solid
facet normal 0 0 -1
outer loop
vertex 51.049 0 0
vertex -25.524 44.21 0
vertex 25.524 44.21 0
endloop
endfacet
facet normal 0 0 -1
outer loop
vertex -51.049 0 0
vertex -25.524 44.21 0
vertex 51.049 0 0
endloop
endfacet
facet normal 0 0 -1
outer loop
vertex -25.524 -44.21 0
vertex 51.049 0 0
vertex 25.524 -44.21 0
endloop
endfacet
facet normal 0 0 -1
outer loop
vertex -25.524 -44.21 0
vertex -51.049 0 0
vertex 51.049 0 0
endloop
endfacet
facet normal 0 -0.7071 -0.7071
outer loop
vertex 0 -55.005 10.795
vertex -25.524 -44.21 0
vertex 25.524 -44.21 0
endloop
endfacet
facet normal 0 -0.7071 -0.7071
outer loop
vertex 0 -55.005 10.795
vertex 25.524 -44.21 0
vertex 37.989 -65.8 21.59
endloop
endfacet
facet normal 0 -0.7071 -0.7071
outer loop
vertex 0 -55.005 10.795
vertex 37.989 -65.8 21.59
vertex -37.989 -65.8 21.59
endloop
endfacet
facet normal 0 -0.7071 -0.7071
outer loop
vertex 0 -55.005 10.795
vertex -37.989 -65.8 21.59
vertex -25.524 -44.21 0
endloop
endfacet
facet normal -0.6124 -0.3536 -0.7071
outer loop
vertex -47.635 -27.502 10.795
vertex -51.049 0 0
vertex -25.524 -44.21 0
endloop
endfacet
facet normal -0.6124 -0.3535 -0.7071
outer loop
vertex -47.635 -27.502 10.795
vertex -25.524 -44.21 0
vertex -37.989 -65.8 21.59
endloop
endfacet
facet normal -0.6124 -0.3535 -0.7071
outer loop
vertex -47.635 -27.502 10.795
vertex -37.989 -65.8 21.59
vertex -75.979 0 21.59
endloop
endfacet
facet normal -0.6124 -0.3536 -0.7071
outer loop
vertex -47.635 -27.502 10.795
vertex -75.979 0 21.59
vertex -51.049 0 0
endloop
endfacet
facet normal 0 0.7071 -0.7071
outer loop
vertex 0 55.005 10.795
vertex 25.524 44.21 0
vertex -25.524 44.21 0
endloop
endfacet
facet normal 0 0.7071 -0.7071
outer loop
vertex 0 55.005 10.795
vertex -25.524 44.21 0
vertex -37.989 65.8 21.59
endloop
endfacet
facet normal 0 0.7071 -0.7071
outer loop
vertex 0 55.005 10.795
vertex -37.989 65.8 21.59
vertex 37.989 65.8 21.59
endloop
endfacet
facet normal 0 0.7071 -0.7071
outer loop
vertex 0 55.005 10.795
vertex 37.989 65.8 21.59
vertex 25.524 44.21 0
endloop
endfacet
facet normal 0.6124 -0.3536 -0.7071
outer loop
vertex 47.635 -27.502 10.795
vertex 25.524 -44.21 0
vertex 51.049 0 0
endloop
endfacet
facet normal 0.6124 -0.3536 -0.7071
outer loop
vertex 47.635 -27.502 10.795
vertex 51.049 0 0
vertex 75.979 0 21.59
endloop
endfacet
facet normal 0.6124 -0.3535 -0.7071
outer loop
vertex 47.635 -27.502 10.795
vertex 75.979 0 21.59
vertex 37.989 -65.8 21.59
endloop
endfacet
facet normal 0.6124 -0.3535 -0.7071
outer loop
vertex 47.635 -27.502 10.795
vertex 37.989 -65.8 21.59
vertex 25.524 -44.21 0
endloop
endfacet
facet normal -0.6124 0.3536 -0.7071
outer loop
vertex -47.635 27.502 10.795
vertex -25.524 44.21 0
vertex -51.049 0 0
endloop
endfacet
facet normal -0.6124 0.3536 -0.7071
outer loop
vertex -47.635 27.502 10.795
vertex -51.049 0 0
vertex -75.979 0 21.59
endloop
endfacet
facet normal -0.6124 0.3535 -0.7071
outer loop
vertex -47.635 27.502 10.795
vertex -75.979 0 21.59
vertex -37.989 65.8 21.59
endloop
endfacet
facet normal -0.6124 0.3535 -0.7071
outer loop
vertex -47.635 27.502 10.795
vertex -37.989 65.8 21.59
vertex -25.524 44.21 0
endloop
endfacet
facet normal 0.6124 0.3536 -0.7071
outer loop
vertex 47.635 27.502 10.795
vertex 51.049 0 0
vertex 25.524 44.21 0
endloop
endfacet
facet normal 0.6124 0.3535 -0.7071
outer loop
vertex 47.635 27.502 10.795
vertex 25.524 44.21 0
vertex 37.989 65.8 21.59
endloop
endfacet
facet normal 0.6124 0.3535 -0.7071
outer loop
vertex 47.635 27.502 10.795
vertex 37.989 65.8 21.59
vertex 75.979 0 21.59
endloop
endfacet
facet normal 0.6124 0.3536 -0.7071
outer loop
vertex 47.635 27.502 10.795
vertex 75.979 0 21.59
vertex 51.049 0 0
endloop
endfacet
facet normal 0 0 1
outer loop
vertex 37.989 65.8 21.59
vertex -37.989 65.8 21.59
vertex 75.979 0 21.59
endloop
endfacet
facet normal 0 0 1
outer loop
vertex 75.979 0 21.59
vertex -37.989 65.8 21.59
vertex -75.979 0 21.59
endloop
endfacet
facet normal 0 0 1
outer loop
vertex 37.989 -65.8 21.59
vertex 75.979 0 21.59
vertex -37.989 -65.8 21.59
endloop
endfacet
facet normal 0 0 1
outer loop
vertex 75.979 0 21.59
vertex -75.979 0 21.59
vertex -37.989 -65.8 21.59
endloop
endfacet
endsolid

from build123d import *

# Parameters (mm, degrees)
F1_DEPTH = 21.59
F1_TAPER = -45


with BuildPart() as f1:
    # F0 (on Top) → F1 (new body)
    with BuildSketch(Plane.XY):
        Polygon((-25.524482131, 44.2096998878), (-51.048964262, 0), (-25.524482131, -44.2096998878), (25.524482131, -44.2096998878), (51.048964262, 0), (25.524482131, 44.2096998878), align=None)
    extrude(amount=F1_DEPTH, taper=F1_TAPER)


solid = f1.part
